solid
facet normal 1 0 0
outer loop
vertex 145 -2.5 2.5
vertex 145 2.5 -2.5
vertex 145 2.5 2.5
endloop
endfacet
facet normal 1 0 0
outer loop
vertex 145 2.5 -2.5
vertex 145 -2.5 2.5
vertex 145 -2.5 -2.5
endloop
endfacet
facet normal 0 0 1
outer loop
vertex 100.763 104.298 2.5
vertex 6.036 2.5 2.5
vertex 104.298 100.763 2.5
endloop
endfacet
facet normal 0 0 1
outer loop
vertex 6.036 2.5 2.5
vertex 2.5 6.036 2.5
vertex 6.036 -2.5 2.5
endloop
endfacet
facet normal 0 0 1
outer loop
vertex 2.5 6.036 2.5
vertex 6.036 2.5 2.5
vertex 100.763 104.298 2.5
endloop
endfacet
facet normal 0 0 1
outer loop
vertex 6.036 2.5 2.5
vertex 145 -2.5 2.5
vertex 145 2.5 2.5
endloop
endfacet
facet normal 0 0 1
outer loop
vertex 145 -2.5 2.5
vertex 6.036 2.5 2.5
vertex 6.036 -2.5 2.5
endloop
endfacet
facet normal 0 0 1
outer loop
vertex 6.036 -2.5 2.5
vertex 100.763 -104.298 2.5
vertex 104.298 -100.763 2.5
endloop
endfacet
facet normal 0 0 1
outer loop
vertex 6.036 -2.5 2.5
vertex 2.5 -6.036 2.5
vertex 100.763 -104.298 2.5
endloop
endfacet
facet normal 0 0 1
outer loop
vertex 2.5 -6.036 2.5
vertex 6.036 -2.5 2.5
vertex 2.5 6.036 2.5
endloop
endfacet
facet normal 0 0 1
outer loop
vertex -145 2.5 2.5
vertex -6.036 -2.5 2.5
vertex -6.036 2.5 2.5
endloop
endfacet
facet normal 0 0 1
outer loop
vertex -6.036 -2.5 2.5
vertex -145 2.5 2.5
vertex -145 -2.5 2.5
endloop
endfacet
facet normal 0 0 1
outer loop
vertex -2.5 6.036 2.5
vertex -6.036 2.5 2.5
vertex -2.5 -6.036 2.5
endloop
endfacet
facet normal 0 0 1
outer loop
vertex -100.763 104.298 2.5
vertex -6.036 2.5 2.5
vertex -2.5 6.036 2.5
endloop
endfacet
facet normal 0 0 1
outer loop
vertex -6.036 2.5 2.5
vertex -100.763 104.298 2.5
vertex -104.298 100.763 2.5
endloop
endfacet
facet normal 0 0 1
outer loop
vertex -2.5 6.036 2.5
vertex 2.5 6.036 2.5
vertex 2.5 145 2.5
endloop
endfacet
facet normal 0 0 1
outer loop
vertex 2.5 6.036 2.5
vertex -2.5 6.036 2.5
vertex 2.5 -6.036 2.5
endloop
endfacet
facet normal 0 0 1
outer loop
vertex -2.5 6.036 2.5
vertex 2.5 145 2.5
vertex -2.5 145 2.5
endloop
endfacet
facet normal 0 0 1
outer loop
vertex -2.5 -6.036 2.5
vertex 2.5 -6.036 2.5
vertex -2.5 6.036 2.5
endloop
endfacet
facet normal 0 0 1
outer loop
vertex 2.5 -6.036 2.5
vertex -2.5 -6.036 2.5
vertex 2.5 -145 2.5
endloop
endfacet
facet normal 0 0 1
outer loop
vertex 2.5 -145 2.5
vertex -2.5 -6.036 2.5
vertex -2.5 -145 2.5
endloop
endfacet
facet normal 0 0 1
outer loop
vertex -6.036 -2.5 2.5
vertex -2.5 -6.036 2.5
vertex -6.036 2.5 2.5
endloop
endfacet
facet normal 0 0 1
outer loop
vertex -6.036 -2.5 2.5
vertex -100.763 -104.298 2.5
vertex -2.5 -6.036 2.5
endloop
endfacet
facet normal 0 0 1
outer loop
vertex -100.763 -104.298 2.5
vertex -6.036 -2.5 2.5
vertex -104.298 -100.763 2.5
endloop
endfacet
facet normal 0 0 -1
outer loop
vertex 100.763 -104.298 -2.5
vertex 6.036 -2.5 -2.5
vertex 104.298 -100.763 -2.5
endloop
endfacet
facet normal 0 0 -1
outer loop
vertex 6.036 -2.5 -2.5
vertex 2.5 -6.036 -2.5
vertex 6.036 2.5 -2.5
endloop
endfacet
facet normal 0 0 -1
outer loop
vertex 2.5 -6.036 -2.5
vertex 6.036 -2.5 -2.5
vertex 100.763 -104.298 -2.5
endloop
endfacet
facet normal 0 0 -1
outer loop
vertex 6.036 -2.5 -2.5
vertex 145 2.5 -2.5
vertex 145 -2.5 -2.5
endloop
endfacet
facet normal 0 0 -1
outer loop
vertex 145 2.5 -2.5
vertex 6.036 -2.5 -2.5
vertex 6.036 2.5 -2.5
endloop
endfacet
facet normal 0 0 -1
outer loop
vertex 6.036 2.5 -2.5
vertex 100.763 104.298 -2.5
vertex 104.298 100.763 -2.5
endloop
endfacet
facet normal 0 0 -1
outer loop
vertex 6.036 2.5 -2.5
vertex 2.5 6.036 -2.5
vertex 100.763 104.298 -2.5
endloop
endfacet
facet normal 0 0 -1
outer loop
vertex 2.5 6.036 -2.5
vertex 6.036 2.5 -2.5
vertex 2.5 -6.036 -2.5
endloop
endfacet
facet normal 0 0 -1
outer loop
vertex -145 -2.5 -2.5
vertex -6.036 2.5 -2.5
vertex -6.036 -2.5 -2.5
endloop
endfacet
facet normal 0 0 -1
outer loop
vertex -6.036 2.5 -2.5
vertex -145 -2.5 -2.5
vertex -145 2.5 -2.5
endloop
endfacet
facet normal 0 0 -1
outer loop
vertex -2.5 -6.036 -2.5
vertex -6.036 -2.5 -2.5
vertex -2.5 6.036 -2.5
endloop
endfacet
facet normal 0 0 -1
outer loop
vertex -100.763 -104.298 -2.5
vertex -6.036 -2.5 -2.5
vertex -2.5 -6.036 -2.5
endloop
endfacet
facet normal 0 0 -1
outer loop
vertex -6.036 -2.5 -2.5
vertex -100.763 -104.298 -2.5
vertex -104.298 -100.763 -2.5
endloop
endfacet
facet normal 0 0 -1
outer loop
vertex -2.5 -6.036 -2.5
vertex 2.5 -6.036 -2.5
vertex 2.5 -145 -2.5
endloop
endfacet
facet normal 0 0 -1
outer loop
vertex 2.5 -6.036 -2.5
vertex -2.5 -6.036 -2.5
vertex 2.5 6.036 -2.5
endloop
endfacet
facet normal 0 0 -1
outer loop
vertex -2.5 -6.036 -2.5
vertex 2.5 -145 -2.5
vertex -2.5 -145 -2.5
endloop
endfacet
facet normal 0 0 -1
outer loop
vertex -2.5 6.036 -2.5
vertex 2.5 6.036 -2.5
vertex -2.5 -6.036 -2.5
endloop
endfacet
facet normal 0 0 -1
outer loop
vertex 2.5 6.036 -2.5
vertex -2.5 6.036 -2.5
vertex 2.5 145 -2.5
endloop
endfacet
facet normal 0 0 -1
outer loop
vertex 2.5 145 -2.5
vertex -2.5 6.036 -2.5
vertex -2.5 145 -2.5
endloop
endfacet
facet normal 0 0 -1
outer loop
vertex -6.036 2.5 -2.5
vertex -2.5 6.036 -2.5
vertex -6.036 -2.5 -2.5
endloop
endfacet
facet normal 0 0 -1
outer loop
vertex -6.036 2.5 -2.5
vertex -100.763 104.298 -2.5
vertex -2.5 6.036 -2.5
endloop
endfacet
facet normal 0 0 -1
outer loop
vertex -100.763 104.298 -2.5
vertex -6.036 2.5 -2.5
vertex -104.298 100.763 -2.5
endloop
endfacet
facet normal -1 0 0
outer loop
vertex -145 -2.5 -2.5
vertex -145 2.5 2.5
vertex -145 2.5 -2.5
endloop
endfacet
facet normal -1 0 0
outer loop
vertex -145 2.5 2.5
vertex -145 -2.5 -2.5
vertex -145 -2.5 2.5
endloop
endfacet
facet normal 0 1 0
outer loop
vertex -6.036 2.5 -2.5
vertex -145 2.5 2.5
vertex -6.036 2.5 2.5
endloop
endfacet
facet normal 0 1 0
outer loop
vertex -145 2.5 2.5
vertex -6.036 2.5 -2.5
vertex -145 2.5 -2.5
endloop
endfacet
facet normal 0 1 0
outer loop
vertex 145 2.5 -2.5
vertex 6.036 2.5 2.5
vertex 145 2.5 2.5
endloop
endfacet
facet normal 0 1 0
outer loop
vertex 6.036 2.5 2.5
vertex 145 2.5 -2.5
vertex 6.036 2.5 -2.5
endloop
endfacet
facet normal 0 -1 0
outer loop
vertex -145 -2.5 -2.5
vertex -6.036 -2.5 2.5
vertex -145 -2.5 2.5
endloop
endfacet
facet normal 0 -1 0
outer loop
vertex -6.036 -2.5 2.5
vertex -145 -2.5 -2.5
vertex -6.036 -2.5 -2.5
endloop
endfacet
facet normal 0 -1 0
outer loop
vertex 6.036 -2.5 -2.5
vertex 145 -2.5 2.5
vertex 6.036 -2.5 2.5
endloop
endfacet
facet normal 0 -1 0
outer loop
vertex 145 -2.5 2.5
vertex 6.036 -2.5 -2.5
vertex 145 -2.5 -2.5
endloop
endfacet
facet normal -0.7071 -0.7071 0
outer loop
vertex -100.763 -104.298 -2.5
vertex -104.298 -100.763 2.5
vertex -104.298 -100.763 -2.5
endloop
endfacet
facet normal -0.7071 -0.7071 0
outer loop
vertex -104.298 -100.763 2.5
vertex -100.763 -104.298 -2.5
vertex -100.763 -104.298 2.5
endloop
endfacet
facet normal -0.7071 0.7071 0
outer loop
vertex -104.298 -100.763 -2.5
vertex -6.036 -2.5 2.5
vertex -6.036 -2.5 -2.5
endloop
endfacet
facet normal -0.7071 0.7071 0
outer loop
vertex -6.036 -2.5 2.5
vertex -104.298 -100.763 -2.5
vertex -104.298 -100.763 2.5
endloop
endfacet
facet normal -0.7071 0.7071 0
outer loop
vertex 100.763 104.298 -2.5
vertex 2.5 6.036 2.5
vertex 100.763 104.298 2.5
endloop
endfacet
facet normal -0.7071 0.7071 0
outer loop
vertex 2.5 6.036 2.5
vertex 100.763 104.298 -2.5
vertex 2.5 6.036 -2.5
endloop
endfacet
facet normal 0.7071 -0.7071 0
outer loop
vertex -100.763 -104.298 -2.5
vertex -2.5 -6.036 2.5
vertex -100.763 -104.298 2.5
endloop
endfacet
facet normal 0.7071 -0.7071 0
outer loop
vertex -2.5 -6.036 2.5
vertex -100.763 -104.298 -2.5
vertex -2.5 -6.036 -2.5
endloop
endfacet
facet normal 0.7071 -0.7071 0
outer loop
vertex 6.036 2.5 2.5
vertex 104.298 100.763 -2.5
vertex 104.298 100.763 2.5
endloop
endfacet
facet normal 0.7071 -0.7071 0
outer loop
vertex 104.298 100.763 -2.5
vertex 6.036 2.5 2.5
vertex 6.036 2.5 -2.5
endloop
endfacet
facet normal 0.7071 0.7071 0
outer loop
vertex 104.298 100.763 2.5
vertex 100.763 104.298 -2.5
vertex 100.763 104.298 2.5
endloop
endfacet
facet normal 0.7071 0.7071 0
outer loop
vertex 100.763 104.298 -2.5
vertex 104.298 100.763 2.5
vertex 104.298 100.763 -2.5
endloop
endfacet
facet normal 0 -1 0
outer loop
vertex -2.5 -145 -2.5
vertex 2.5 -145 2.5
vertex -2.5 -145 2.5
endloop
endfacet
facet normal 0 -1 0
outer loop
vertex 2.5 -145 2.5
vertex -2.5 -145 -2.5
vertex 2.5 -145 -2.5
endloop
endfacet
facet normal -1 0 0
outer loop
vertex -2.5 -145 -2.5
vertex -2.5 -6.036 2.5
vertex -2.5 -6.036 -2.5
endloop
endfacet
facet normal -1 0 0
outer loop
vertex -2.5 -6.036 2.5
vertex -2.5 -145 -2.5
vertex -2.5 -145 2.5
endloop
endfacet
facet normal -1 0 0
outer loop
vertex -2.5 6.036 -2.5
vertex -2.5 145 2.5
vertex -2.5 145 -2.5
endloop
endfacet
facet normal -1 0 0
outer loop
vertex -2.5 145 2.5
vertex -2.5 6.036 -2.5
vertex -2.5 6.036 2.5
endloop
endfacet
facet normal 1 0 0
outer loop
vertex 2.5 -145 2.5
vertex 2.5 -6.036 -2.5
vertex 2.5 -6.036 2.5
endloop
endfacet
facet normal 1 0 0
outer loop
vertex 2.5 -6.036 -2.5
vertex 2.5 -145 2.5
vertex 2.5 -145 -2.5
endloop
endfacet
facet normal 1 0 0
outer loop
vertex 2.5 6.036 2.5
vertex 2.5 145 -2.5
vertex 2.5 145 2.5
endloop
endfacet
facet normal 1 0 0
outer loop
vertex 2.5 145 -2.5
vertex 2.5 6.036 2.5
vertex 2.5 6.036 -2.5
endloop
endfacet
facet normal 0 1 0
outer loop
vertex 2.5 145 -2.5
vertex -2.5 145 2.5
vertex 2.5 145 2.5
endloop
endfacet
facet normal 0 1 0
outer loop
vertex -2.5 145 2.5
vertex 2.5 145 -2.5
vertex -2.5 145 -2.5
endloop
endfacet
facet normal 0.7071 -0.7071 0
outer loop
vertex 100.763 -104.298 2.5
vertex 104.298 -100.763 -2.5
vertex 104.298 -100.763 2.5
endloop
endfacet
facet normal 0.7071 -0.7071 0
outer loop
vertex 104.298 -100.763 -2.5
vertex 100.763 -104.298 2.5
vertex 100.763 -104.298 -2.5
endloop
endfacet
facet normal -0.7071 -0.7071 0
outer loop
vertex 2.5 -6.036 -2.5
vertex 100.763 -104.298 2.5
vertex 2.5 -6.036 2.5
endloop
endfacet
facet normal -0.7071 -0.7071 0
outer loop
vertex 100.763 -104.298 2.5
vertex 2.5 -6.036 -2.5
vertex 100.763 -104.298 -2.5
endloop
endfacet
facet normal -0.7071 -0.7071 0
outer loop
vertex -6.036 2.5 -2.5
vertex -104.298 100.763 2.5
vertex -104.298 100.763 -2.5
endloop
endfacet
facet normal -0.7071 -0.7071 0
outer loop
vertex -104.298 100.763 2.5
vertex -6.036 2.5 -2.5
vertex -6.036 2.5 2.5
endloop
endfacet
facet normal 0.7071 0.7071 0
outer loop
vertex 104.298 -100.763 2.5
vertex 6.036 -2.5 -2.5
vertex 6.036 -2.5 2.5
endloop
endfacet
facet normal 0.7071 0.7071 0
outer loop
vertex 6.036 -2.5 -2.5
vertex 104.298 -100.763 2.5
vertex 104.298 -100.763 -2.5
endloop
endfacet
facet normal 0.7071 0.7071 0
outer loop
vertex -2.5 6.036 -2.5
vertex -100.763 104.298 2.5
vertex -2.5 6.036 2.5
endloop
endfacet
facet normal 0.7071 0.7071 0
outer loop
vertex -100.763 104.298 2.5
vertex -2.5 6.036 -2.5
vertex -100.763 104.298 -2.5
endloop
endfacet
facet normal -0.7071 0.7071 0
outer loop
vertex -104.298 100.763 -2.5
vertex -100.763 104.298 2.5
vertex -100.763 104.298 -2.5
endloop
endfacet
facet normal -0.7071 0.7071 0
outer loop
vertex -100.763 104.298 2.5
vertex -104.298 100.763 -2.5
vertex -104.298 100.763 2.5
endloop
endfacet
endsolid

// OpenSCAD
dia = 290;
nr0fArms = 4;
angleStep = 180/nr0fArms;

for (phi =[0:angleStep:180-angleStep]){
  rotate([0,0,phi])cube(size = [dia,5,5], center=true);
}
